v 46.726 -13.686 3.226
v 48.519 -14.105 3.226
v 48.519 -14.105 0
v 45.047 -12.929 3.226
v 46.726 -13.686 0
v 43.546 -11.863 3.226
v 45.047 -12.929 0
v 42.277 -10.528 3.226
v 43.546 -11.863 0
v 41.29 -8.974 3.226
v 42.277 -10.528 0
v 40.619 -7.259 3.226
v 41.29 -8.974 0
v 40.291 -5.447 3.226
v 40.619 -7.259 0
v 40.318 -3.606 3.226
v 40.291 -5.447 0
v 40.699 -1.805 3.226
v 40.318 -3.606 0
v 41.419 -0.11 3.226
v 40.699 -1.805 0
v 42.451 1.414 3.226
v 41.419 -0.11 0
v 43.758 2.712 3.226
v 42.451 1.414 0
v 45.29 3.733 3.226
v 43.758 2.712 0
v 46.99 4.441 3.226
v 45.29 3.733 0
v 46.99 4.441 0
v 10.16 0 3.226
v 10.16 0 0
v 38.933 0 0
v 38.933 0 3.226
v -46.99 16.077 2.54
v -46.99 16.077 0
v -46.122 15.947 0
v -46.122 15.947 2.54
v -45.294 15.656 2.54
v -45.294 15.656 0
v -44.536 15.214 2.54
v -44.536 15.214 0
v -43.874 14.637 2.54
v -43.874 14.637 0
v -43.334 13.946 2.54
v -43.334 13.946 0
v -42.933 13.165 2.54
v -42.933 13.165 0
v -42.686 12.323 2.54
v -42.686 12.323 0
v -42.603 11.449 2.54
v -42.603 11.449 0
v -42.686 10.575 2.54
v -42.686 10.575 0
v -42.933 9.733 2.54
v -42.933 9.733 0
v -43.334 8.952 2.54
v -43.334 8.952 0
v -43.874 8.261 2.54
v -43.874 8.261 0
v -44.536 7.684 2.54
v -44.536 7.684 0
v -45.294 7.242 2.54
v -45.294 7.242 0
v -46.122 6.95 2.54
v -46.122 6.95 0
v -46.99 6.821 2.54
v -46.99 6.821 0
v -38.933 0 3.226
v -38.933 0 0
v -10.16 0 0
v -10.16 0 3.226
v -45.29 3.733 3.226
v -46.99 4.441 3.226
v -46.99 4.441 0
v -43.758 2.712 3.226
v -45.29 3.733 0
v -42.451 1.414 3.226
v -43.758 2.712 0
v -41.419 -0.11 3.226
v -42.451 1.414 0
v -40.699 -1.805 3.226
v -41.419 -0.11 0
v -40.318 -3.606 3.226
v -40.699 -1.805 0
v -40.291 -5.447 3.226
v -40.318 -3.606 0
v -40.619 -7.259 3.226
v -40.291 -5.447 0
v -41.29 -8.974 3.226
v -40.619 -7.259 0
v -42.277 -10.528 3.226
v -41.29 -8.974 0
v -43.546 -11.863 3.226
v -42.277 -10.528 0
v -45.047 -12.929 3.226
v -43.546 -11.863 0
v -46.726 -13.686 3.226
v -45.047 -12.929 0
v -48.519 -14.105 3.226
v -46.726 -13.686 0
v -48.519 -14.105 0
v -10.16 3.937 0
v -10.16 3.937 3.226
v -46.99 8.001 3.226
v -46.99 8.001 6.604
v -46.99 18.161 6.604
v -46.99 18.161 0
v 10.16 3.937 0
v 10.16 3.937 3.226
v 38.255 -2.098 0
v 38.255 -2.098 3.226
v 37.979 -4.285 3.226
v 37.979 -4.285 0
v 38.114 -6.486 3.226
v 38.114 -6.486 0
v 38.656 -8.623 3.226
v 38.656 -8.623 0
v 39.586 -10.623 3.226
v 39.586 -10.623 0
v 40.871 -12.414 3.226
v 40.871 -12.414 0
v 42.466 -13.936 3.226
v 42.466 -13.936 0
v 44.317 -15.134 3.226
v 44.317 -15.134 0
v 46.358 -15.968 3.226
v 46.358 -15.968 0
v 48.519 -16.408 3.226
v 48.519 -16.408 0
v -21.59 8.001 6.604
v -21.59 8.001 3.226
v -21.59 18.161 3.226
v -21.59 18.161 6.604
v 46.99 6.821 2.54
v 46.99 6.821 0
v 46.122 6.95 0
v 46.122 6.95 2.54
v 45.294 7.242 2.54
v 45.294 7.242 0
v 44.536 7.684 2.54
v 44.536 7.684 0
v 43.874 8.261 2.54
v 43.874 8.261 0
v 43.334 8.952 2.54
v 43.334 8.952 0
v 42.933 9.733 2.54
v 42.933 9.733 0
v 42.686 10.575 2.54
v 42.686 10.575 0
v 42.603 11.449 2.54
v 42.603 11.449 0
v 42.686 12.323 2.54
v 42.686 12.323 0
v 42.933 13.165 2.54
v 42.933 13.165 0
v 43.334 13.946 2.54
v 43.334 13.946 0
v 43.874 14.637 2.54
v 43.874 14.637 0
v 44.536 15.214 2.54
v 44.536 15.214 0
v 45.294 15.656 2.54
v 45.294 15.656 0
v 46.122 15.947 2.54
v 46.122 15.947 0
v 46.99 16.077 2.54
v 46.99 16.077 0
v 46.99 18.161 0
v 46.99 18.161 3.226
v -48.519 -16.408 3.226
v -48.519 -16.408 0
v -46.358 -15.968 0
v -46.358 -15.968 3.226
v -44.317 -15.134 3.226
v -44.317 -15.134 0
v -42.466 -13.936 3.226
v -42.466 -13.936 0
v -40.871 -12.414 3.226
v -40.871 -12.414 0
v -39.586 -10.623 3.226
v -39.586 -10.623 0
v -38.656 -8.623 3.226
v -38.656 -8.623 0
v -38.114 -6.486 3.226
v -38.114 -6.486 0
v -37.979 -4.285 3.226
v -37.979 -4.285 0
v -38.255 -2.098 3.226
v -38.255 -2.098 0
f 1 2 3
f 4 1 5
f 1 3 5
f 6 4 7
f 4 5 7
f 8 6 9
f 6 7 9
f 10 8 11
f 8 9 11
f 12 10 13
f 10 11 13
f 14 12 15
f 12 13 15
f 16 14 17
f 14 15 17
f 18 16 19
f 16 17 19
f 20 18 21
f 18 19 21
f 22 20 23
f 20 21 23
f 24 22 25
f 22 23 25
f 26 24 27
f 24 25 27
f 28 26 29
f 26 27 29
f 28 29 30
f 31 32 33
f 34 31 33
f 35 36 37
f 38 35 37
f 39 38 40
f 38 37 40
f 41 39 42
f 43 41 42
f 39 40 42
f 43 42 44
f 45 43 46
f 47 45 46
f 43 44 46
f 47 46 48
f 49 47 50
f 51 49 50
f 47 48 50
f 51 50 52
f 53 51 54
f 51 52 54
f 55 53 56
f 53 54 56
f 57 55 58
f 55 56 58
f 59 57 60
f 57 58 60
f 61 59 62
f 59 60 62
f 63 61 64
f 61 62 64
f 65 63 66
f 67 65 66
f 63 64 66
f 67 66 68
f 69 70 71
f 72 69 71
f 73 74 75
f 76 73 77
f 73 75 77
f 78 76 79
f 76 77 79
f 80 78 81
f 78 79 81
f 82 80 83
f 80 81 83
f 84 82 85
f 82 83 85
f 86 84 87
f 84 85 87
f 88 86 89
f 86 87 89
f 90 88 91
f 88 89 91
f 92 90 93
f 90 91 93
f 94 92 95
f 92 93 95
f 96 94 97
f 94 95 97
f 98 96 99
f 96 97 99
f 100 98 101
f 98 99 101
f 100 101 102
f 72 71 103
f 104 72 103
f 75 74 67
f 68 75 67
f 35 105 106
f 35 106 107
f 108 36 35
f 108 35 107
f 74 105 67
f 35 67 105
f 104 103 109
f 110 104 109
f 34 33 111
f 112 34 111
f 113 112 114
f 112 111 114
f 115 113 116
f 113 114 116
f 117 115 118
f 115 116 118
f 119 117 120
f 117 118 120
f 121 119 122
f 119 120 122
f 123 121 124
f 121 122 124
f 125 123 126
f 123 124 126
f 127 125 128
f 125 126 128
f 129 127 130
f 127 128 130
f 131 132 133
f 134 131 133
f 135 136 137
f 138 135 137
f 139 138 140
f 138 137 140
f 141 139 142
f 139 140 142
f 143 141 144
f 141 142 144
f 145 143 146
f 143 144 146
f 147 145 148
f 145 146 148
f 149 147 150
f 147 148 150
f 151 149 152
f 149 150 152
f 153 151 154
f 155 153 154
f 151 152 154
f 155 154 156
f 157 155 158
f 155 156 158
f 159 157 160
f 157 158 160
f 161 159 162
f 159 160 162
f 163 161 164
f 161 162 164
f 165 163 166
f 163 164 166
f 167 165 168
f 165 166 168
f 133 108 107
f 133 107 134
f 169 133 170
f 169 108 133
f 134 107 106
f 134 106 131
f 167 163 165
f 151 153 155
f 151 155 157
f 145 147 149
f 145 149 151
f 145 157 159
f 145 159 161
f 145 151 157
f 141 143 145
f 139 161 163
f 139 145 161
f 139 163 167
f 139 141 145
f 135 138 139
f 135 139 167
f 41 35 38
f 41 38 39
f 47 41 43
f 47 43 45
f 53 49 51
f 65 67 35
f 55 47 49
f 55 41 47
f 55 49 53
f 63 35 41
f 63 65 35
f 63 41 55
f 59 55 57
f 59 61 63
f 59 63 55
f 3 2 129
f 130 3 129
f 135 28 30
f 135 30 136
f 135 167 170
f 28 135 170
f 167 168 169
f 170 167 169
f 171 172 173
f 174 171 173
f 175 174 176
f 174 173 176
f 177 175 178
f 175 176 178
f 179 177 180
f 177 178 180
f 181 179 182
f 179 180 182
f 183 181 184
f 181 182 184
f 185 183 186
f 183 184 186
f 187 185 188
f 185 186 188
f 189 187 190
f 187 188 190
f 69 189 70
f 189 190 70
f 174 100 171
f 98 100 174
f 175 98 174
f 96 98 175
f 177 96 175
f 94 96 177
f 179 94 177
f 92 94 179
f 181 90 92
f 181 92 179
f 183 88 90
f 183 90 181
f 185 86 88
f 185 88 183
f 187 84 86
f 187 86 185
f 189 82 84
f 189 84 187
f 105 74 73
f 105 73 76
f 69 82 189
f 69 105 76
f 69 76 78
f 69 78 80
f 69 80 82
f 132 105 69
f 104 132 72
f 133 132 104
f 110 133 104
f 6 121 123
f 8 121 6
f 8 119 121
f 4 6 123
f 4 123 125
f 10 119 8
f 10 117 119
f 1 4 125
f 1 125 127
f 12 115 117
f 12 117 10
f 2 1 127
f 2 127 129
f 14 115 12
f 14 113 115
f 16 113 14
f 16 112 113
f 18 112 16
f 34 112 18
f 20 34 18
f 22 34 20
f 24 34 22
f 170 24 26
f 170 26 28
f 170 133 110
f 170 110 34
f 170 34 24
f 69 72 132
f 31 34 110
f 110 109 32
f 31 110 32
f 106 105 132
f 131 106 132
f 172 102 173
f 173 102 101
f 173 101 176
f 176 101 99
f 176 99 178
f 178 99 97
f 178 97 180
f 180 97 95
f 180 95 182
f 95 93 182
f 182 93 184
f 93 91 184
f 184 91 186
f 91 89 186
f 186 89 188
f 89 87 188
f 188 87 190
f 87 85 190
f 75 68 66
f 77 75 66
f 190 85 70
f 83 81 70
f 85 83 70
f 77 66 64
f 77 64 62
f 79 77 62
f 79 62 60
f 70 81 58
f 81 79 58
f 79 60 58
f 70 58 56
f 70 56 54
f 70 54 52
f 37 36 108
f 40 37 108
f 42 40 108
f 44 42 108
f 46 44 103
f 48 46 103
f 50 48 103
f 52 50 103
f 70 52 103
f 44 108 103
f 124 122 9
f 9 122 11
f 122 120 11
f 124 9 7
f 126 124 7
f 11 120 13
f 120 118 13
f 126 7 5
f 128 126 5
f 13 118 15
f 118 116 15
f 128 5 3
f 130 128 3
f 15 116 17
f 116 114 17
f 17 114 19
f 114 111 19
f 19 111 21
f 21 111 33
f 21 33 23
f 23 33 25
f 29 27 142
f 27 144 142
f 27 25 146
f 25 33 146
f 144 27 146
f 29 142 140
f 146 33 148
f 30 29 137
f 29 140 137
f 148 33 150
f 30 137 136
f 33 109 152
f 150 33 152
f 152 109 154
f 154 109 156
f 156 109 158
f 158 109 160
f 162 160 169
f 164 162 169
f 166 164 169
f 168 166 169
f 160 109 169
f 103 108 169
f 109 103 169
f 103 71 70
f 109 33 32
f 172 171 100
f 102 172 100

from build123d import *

# Parameters (mm, degrees)
F1_DEPTH = 3.2258
F2_W     = 25.4
F2_H     = 10.16
F3_DEPTH = 3.3782
F5_DEPTH = 2.54
F7_DEPTH = 3.2268


with BuildPart() as f1:
    # F0 (on Top) → F1 (new body)
    with BuildSketch(Plane.XY):
        with BuildLine():
            Line((46.99, 18.161), (-46.99, 18.161))
            Line((-46.99, 18.161), (-46.99, 4.441107))
            ThreePointArc((-46.99, 4.441107), (-40.364333, -6.077512), (-49.784, -14.189891))
            Line((-49.784, -14.189891), (-49.784, -16.475891))
            ThreePointArc((-49.784, -16.475891), (-39.920006, -11.161147), (-38.933262, 0))
            Line((-38.933262, 0), (-10.16, 0))
            Line((-10.16, 0), (-10.16, 3.937))
            Line((-10.16, 3.937), (10.16, 3.937))
            Line((10.16, 3.937), (10.16, 0))
            Line((10.16, 0), (38.933262, 0))
            ThreePointArc((38.933262, 0), (39.920006, -11.161147), (49.784, -16.475891))
            Line((49.784, -16.475891), (49.784, -14.189891))
            ThreePointArc((49.784, -14.189891), (40.364333, -6.077512), (46.99, 4.441107))
            Line((46.99, 4.441107), (46.99, 18.161))
        make_face()
    extrude(amount=F1_DEPTH)

    # F2 (on face) → F3 (join)
    with BuildSketch(Plane.XY.offset(3.2258)):
        with Locations((-34.29, 13.081)):
            Rectangle(F2_W, F2_H)
    extrude(amount=F3_DEPTH)

    # F4 (on face) → F5 (cut)
    with BuildSketch(Plane(origin=(0, 0, 0), x_dir=(1, 0, 0), z_dir=(0, 0, -1))):
        with BuildLine():
            Line((-46.99, -6.820624), (-46.99, -16.077196))
            ThreePointArc((-46.99, -16.077196), (-42.60338, -11.44891), (-46.99, -6.820624))
        make_face()
        with BuildLine():
            ThreePointArc((46.99, -6.820624), (42.60338, -11.44891), (46.99, -16.077196))
            Line((46.99, -16.077196), (46.99, -6.820624))
        make_face()
    extrude(amount=-F5_DEPTH, mode=Mode.SUBTRACT)

    # F6 (on face) → F7 (cut, through all)
    with BuildSketch(Plane.XY.offset(3.2258)):
        with BuildLine():
            Line((-48.518732, -16.407924), (-48.518732, -14.10548))
            ThreePointArc((-48.518732, -14.10548), (-49.149959, -14.168765), (-49.784, -14.189891))
            Line((-49.784, -14.189891), (-49.784, -16.475891))
            ThreePointArc((-49.784, -16.475891), (-49.150454, -16.458887), (-48.518732, -16.407924))
        make_face()
        with BuildLine():
            ThreePointArc((48.518732, -16.407924), (49.150454, -16.458887), (49.784, -16.475891))
            Line((49.784, -16.475891), (49.784, -14.189891))
            ThreePointArc((49.784, -14.189891), (49.149959, -14.168765), (48.518732, -14.10548))
            Line((48.518732, -14.10548), (48.518732, -16.407924))
        make_face()
    extrude(amount=-F7_DEPTH, mode=Mode.SUBTRACT)


solid = f1.part
